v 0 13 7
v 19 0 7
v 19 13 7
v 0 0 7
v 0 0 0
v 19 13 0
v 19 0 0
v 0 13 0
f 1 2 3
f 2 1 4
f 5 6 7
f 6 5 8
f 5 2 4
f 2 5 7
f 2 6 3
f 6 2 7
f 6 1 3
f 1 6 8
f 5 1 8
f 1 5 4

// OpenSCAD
// Generated by SolidPython 1.0.1 on 2020-07-29 00:46:56


cube(size = [19, 13, 7]);
/***********************************************
*********      SolidPython code:      **********
************************************************
 
# import packages: SolidPython
from solid import *
from solid.utils import *
from itertools import chain, combinations, permutations


class Resize:

    def __init__(self, scad_file):
        self.scad_file = scad_file
        #self.scad_file = import_scad(scad_file)
        # cone/cylinder param:
        self.r1 = 0
        self.r2 = 0
        self.h = 0
        # rectangular prism param:
        self.w = 0
        self.l = 0
        # ellipse param:
        self.r = 0

    # import OpenScad code (file name corresponds to shape)


    # classify shape + parameters
    def assign(self, param1, param2, param3):
        if self.scad_file == 'cone.scad':
            self.r1 = param1
            self.r2 = param2
            self.h = param3
        elif self.scad_file == 'cylinder.scad':
            self.r1 = param1
            self.r2 = param2
            self.h = param3
        elif self.scad_file == 'rectangularPrism.scad':
            self.h = param1
            self.l = param2
            self.w = param3
        else:
            self.r = param1
            self.h = param2

    # resize parameters
    def iterate(self):
        x = range(3, 20, 2)
        i = 1
        if self.scad_file == 'cone.scad':
            tempList = list(permutations(x, 2))
            for temp in tempList:
                param1 = temp[0]
                param2 = temp[1]
                filepath = 'produced_scad_files/' + 'cone' + str(param1) + '_' + str(param2) + '_' + '.scad'
                scad_render_to_file(cylinder(h=param1, r1=param2, r2=0), filepath)

        elif self.scad_file == 'cylinder.scad':
            tempList = list(permutations(x, 3))
            for temp in tempList:
                param1 = temp[0]
                param2 = temp[1]
                filepath = 'produced_scad_files/' + 'cylinder' + str(param1) + '_' + str(param2) + '_' + '.scad'
                scad_render_to_file(cylinder(h=param1, r1=param2, r2=param2), filepath)

        elif self.scad_file == 'rectangularPrism.scad':
            tempList = list(permutations(x, 3))
            for temp in tempList:
                param1 = temp[0]
                param2 = temp[1]
                param3 = temp[2]
                filepath = 'produced_scad_files/' + 'rectangularPrism' + str(param1) + '_' + str(param2) + '_' + str(
                    param3) + '.scad'
                scad_render_to_file(cube(size=(param1, param2, param3)), filepath)

        elif self.scad_file == 'ellipse.scad':
            tempList = list(permutations(x, 4))
            for temp in tempList:
                param1 = temp[0]
                param2 = temp[1]
                param3 = temp[2]
                param4 = temp[3]
                filepath = 'produced_scad_files/' + 'ellipse' + str(param1) + '_' + str(param2) + '_' + str(param3) + '_' + str(param4) + '.scad'
                scad_render_to_file(scale([param1, param2, param3])(sphere(r=param4)), filepath)

    def render_to_scadfile(self):
        scad_render_to_file(scad, 'example.scad') 
 
************************************************/
